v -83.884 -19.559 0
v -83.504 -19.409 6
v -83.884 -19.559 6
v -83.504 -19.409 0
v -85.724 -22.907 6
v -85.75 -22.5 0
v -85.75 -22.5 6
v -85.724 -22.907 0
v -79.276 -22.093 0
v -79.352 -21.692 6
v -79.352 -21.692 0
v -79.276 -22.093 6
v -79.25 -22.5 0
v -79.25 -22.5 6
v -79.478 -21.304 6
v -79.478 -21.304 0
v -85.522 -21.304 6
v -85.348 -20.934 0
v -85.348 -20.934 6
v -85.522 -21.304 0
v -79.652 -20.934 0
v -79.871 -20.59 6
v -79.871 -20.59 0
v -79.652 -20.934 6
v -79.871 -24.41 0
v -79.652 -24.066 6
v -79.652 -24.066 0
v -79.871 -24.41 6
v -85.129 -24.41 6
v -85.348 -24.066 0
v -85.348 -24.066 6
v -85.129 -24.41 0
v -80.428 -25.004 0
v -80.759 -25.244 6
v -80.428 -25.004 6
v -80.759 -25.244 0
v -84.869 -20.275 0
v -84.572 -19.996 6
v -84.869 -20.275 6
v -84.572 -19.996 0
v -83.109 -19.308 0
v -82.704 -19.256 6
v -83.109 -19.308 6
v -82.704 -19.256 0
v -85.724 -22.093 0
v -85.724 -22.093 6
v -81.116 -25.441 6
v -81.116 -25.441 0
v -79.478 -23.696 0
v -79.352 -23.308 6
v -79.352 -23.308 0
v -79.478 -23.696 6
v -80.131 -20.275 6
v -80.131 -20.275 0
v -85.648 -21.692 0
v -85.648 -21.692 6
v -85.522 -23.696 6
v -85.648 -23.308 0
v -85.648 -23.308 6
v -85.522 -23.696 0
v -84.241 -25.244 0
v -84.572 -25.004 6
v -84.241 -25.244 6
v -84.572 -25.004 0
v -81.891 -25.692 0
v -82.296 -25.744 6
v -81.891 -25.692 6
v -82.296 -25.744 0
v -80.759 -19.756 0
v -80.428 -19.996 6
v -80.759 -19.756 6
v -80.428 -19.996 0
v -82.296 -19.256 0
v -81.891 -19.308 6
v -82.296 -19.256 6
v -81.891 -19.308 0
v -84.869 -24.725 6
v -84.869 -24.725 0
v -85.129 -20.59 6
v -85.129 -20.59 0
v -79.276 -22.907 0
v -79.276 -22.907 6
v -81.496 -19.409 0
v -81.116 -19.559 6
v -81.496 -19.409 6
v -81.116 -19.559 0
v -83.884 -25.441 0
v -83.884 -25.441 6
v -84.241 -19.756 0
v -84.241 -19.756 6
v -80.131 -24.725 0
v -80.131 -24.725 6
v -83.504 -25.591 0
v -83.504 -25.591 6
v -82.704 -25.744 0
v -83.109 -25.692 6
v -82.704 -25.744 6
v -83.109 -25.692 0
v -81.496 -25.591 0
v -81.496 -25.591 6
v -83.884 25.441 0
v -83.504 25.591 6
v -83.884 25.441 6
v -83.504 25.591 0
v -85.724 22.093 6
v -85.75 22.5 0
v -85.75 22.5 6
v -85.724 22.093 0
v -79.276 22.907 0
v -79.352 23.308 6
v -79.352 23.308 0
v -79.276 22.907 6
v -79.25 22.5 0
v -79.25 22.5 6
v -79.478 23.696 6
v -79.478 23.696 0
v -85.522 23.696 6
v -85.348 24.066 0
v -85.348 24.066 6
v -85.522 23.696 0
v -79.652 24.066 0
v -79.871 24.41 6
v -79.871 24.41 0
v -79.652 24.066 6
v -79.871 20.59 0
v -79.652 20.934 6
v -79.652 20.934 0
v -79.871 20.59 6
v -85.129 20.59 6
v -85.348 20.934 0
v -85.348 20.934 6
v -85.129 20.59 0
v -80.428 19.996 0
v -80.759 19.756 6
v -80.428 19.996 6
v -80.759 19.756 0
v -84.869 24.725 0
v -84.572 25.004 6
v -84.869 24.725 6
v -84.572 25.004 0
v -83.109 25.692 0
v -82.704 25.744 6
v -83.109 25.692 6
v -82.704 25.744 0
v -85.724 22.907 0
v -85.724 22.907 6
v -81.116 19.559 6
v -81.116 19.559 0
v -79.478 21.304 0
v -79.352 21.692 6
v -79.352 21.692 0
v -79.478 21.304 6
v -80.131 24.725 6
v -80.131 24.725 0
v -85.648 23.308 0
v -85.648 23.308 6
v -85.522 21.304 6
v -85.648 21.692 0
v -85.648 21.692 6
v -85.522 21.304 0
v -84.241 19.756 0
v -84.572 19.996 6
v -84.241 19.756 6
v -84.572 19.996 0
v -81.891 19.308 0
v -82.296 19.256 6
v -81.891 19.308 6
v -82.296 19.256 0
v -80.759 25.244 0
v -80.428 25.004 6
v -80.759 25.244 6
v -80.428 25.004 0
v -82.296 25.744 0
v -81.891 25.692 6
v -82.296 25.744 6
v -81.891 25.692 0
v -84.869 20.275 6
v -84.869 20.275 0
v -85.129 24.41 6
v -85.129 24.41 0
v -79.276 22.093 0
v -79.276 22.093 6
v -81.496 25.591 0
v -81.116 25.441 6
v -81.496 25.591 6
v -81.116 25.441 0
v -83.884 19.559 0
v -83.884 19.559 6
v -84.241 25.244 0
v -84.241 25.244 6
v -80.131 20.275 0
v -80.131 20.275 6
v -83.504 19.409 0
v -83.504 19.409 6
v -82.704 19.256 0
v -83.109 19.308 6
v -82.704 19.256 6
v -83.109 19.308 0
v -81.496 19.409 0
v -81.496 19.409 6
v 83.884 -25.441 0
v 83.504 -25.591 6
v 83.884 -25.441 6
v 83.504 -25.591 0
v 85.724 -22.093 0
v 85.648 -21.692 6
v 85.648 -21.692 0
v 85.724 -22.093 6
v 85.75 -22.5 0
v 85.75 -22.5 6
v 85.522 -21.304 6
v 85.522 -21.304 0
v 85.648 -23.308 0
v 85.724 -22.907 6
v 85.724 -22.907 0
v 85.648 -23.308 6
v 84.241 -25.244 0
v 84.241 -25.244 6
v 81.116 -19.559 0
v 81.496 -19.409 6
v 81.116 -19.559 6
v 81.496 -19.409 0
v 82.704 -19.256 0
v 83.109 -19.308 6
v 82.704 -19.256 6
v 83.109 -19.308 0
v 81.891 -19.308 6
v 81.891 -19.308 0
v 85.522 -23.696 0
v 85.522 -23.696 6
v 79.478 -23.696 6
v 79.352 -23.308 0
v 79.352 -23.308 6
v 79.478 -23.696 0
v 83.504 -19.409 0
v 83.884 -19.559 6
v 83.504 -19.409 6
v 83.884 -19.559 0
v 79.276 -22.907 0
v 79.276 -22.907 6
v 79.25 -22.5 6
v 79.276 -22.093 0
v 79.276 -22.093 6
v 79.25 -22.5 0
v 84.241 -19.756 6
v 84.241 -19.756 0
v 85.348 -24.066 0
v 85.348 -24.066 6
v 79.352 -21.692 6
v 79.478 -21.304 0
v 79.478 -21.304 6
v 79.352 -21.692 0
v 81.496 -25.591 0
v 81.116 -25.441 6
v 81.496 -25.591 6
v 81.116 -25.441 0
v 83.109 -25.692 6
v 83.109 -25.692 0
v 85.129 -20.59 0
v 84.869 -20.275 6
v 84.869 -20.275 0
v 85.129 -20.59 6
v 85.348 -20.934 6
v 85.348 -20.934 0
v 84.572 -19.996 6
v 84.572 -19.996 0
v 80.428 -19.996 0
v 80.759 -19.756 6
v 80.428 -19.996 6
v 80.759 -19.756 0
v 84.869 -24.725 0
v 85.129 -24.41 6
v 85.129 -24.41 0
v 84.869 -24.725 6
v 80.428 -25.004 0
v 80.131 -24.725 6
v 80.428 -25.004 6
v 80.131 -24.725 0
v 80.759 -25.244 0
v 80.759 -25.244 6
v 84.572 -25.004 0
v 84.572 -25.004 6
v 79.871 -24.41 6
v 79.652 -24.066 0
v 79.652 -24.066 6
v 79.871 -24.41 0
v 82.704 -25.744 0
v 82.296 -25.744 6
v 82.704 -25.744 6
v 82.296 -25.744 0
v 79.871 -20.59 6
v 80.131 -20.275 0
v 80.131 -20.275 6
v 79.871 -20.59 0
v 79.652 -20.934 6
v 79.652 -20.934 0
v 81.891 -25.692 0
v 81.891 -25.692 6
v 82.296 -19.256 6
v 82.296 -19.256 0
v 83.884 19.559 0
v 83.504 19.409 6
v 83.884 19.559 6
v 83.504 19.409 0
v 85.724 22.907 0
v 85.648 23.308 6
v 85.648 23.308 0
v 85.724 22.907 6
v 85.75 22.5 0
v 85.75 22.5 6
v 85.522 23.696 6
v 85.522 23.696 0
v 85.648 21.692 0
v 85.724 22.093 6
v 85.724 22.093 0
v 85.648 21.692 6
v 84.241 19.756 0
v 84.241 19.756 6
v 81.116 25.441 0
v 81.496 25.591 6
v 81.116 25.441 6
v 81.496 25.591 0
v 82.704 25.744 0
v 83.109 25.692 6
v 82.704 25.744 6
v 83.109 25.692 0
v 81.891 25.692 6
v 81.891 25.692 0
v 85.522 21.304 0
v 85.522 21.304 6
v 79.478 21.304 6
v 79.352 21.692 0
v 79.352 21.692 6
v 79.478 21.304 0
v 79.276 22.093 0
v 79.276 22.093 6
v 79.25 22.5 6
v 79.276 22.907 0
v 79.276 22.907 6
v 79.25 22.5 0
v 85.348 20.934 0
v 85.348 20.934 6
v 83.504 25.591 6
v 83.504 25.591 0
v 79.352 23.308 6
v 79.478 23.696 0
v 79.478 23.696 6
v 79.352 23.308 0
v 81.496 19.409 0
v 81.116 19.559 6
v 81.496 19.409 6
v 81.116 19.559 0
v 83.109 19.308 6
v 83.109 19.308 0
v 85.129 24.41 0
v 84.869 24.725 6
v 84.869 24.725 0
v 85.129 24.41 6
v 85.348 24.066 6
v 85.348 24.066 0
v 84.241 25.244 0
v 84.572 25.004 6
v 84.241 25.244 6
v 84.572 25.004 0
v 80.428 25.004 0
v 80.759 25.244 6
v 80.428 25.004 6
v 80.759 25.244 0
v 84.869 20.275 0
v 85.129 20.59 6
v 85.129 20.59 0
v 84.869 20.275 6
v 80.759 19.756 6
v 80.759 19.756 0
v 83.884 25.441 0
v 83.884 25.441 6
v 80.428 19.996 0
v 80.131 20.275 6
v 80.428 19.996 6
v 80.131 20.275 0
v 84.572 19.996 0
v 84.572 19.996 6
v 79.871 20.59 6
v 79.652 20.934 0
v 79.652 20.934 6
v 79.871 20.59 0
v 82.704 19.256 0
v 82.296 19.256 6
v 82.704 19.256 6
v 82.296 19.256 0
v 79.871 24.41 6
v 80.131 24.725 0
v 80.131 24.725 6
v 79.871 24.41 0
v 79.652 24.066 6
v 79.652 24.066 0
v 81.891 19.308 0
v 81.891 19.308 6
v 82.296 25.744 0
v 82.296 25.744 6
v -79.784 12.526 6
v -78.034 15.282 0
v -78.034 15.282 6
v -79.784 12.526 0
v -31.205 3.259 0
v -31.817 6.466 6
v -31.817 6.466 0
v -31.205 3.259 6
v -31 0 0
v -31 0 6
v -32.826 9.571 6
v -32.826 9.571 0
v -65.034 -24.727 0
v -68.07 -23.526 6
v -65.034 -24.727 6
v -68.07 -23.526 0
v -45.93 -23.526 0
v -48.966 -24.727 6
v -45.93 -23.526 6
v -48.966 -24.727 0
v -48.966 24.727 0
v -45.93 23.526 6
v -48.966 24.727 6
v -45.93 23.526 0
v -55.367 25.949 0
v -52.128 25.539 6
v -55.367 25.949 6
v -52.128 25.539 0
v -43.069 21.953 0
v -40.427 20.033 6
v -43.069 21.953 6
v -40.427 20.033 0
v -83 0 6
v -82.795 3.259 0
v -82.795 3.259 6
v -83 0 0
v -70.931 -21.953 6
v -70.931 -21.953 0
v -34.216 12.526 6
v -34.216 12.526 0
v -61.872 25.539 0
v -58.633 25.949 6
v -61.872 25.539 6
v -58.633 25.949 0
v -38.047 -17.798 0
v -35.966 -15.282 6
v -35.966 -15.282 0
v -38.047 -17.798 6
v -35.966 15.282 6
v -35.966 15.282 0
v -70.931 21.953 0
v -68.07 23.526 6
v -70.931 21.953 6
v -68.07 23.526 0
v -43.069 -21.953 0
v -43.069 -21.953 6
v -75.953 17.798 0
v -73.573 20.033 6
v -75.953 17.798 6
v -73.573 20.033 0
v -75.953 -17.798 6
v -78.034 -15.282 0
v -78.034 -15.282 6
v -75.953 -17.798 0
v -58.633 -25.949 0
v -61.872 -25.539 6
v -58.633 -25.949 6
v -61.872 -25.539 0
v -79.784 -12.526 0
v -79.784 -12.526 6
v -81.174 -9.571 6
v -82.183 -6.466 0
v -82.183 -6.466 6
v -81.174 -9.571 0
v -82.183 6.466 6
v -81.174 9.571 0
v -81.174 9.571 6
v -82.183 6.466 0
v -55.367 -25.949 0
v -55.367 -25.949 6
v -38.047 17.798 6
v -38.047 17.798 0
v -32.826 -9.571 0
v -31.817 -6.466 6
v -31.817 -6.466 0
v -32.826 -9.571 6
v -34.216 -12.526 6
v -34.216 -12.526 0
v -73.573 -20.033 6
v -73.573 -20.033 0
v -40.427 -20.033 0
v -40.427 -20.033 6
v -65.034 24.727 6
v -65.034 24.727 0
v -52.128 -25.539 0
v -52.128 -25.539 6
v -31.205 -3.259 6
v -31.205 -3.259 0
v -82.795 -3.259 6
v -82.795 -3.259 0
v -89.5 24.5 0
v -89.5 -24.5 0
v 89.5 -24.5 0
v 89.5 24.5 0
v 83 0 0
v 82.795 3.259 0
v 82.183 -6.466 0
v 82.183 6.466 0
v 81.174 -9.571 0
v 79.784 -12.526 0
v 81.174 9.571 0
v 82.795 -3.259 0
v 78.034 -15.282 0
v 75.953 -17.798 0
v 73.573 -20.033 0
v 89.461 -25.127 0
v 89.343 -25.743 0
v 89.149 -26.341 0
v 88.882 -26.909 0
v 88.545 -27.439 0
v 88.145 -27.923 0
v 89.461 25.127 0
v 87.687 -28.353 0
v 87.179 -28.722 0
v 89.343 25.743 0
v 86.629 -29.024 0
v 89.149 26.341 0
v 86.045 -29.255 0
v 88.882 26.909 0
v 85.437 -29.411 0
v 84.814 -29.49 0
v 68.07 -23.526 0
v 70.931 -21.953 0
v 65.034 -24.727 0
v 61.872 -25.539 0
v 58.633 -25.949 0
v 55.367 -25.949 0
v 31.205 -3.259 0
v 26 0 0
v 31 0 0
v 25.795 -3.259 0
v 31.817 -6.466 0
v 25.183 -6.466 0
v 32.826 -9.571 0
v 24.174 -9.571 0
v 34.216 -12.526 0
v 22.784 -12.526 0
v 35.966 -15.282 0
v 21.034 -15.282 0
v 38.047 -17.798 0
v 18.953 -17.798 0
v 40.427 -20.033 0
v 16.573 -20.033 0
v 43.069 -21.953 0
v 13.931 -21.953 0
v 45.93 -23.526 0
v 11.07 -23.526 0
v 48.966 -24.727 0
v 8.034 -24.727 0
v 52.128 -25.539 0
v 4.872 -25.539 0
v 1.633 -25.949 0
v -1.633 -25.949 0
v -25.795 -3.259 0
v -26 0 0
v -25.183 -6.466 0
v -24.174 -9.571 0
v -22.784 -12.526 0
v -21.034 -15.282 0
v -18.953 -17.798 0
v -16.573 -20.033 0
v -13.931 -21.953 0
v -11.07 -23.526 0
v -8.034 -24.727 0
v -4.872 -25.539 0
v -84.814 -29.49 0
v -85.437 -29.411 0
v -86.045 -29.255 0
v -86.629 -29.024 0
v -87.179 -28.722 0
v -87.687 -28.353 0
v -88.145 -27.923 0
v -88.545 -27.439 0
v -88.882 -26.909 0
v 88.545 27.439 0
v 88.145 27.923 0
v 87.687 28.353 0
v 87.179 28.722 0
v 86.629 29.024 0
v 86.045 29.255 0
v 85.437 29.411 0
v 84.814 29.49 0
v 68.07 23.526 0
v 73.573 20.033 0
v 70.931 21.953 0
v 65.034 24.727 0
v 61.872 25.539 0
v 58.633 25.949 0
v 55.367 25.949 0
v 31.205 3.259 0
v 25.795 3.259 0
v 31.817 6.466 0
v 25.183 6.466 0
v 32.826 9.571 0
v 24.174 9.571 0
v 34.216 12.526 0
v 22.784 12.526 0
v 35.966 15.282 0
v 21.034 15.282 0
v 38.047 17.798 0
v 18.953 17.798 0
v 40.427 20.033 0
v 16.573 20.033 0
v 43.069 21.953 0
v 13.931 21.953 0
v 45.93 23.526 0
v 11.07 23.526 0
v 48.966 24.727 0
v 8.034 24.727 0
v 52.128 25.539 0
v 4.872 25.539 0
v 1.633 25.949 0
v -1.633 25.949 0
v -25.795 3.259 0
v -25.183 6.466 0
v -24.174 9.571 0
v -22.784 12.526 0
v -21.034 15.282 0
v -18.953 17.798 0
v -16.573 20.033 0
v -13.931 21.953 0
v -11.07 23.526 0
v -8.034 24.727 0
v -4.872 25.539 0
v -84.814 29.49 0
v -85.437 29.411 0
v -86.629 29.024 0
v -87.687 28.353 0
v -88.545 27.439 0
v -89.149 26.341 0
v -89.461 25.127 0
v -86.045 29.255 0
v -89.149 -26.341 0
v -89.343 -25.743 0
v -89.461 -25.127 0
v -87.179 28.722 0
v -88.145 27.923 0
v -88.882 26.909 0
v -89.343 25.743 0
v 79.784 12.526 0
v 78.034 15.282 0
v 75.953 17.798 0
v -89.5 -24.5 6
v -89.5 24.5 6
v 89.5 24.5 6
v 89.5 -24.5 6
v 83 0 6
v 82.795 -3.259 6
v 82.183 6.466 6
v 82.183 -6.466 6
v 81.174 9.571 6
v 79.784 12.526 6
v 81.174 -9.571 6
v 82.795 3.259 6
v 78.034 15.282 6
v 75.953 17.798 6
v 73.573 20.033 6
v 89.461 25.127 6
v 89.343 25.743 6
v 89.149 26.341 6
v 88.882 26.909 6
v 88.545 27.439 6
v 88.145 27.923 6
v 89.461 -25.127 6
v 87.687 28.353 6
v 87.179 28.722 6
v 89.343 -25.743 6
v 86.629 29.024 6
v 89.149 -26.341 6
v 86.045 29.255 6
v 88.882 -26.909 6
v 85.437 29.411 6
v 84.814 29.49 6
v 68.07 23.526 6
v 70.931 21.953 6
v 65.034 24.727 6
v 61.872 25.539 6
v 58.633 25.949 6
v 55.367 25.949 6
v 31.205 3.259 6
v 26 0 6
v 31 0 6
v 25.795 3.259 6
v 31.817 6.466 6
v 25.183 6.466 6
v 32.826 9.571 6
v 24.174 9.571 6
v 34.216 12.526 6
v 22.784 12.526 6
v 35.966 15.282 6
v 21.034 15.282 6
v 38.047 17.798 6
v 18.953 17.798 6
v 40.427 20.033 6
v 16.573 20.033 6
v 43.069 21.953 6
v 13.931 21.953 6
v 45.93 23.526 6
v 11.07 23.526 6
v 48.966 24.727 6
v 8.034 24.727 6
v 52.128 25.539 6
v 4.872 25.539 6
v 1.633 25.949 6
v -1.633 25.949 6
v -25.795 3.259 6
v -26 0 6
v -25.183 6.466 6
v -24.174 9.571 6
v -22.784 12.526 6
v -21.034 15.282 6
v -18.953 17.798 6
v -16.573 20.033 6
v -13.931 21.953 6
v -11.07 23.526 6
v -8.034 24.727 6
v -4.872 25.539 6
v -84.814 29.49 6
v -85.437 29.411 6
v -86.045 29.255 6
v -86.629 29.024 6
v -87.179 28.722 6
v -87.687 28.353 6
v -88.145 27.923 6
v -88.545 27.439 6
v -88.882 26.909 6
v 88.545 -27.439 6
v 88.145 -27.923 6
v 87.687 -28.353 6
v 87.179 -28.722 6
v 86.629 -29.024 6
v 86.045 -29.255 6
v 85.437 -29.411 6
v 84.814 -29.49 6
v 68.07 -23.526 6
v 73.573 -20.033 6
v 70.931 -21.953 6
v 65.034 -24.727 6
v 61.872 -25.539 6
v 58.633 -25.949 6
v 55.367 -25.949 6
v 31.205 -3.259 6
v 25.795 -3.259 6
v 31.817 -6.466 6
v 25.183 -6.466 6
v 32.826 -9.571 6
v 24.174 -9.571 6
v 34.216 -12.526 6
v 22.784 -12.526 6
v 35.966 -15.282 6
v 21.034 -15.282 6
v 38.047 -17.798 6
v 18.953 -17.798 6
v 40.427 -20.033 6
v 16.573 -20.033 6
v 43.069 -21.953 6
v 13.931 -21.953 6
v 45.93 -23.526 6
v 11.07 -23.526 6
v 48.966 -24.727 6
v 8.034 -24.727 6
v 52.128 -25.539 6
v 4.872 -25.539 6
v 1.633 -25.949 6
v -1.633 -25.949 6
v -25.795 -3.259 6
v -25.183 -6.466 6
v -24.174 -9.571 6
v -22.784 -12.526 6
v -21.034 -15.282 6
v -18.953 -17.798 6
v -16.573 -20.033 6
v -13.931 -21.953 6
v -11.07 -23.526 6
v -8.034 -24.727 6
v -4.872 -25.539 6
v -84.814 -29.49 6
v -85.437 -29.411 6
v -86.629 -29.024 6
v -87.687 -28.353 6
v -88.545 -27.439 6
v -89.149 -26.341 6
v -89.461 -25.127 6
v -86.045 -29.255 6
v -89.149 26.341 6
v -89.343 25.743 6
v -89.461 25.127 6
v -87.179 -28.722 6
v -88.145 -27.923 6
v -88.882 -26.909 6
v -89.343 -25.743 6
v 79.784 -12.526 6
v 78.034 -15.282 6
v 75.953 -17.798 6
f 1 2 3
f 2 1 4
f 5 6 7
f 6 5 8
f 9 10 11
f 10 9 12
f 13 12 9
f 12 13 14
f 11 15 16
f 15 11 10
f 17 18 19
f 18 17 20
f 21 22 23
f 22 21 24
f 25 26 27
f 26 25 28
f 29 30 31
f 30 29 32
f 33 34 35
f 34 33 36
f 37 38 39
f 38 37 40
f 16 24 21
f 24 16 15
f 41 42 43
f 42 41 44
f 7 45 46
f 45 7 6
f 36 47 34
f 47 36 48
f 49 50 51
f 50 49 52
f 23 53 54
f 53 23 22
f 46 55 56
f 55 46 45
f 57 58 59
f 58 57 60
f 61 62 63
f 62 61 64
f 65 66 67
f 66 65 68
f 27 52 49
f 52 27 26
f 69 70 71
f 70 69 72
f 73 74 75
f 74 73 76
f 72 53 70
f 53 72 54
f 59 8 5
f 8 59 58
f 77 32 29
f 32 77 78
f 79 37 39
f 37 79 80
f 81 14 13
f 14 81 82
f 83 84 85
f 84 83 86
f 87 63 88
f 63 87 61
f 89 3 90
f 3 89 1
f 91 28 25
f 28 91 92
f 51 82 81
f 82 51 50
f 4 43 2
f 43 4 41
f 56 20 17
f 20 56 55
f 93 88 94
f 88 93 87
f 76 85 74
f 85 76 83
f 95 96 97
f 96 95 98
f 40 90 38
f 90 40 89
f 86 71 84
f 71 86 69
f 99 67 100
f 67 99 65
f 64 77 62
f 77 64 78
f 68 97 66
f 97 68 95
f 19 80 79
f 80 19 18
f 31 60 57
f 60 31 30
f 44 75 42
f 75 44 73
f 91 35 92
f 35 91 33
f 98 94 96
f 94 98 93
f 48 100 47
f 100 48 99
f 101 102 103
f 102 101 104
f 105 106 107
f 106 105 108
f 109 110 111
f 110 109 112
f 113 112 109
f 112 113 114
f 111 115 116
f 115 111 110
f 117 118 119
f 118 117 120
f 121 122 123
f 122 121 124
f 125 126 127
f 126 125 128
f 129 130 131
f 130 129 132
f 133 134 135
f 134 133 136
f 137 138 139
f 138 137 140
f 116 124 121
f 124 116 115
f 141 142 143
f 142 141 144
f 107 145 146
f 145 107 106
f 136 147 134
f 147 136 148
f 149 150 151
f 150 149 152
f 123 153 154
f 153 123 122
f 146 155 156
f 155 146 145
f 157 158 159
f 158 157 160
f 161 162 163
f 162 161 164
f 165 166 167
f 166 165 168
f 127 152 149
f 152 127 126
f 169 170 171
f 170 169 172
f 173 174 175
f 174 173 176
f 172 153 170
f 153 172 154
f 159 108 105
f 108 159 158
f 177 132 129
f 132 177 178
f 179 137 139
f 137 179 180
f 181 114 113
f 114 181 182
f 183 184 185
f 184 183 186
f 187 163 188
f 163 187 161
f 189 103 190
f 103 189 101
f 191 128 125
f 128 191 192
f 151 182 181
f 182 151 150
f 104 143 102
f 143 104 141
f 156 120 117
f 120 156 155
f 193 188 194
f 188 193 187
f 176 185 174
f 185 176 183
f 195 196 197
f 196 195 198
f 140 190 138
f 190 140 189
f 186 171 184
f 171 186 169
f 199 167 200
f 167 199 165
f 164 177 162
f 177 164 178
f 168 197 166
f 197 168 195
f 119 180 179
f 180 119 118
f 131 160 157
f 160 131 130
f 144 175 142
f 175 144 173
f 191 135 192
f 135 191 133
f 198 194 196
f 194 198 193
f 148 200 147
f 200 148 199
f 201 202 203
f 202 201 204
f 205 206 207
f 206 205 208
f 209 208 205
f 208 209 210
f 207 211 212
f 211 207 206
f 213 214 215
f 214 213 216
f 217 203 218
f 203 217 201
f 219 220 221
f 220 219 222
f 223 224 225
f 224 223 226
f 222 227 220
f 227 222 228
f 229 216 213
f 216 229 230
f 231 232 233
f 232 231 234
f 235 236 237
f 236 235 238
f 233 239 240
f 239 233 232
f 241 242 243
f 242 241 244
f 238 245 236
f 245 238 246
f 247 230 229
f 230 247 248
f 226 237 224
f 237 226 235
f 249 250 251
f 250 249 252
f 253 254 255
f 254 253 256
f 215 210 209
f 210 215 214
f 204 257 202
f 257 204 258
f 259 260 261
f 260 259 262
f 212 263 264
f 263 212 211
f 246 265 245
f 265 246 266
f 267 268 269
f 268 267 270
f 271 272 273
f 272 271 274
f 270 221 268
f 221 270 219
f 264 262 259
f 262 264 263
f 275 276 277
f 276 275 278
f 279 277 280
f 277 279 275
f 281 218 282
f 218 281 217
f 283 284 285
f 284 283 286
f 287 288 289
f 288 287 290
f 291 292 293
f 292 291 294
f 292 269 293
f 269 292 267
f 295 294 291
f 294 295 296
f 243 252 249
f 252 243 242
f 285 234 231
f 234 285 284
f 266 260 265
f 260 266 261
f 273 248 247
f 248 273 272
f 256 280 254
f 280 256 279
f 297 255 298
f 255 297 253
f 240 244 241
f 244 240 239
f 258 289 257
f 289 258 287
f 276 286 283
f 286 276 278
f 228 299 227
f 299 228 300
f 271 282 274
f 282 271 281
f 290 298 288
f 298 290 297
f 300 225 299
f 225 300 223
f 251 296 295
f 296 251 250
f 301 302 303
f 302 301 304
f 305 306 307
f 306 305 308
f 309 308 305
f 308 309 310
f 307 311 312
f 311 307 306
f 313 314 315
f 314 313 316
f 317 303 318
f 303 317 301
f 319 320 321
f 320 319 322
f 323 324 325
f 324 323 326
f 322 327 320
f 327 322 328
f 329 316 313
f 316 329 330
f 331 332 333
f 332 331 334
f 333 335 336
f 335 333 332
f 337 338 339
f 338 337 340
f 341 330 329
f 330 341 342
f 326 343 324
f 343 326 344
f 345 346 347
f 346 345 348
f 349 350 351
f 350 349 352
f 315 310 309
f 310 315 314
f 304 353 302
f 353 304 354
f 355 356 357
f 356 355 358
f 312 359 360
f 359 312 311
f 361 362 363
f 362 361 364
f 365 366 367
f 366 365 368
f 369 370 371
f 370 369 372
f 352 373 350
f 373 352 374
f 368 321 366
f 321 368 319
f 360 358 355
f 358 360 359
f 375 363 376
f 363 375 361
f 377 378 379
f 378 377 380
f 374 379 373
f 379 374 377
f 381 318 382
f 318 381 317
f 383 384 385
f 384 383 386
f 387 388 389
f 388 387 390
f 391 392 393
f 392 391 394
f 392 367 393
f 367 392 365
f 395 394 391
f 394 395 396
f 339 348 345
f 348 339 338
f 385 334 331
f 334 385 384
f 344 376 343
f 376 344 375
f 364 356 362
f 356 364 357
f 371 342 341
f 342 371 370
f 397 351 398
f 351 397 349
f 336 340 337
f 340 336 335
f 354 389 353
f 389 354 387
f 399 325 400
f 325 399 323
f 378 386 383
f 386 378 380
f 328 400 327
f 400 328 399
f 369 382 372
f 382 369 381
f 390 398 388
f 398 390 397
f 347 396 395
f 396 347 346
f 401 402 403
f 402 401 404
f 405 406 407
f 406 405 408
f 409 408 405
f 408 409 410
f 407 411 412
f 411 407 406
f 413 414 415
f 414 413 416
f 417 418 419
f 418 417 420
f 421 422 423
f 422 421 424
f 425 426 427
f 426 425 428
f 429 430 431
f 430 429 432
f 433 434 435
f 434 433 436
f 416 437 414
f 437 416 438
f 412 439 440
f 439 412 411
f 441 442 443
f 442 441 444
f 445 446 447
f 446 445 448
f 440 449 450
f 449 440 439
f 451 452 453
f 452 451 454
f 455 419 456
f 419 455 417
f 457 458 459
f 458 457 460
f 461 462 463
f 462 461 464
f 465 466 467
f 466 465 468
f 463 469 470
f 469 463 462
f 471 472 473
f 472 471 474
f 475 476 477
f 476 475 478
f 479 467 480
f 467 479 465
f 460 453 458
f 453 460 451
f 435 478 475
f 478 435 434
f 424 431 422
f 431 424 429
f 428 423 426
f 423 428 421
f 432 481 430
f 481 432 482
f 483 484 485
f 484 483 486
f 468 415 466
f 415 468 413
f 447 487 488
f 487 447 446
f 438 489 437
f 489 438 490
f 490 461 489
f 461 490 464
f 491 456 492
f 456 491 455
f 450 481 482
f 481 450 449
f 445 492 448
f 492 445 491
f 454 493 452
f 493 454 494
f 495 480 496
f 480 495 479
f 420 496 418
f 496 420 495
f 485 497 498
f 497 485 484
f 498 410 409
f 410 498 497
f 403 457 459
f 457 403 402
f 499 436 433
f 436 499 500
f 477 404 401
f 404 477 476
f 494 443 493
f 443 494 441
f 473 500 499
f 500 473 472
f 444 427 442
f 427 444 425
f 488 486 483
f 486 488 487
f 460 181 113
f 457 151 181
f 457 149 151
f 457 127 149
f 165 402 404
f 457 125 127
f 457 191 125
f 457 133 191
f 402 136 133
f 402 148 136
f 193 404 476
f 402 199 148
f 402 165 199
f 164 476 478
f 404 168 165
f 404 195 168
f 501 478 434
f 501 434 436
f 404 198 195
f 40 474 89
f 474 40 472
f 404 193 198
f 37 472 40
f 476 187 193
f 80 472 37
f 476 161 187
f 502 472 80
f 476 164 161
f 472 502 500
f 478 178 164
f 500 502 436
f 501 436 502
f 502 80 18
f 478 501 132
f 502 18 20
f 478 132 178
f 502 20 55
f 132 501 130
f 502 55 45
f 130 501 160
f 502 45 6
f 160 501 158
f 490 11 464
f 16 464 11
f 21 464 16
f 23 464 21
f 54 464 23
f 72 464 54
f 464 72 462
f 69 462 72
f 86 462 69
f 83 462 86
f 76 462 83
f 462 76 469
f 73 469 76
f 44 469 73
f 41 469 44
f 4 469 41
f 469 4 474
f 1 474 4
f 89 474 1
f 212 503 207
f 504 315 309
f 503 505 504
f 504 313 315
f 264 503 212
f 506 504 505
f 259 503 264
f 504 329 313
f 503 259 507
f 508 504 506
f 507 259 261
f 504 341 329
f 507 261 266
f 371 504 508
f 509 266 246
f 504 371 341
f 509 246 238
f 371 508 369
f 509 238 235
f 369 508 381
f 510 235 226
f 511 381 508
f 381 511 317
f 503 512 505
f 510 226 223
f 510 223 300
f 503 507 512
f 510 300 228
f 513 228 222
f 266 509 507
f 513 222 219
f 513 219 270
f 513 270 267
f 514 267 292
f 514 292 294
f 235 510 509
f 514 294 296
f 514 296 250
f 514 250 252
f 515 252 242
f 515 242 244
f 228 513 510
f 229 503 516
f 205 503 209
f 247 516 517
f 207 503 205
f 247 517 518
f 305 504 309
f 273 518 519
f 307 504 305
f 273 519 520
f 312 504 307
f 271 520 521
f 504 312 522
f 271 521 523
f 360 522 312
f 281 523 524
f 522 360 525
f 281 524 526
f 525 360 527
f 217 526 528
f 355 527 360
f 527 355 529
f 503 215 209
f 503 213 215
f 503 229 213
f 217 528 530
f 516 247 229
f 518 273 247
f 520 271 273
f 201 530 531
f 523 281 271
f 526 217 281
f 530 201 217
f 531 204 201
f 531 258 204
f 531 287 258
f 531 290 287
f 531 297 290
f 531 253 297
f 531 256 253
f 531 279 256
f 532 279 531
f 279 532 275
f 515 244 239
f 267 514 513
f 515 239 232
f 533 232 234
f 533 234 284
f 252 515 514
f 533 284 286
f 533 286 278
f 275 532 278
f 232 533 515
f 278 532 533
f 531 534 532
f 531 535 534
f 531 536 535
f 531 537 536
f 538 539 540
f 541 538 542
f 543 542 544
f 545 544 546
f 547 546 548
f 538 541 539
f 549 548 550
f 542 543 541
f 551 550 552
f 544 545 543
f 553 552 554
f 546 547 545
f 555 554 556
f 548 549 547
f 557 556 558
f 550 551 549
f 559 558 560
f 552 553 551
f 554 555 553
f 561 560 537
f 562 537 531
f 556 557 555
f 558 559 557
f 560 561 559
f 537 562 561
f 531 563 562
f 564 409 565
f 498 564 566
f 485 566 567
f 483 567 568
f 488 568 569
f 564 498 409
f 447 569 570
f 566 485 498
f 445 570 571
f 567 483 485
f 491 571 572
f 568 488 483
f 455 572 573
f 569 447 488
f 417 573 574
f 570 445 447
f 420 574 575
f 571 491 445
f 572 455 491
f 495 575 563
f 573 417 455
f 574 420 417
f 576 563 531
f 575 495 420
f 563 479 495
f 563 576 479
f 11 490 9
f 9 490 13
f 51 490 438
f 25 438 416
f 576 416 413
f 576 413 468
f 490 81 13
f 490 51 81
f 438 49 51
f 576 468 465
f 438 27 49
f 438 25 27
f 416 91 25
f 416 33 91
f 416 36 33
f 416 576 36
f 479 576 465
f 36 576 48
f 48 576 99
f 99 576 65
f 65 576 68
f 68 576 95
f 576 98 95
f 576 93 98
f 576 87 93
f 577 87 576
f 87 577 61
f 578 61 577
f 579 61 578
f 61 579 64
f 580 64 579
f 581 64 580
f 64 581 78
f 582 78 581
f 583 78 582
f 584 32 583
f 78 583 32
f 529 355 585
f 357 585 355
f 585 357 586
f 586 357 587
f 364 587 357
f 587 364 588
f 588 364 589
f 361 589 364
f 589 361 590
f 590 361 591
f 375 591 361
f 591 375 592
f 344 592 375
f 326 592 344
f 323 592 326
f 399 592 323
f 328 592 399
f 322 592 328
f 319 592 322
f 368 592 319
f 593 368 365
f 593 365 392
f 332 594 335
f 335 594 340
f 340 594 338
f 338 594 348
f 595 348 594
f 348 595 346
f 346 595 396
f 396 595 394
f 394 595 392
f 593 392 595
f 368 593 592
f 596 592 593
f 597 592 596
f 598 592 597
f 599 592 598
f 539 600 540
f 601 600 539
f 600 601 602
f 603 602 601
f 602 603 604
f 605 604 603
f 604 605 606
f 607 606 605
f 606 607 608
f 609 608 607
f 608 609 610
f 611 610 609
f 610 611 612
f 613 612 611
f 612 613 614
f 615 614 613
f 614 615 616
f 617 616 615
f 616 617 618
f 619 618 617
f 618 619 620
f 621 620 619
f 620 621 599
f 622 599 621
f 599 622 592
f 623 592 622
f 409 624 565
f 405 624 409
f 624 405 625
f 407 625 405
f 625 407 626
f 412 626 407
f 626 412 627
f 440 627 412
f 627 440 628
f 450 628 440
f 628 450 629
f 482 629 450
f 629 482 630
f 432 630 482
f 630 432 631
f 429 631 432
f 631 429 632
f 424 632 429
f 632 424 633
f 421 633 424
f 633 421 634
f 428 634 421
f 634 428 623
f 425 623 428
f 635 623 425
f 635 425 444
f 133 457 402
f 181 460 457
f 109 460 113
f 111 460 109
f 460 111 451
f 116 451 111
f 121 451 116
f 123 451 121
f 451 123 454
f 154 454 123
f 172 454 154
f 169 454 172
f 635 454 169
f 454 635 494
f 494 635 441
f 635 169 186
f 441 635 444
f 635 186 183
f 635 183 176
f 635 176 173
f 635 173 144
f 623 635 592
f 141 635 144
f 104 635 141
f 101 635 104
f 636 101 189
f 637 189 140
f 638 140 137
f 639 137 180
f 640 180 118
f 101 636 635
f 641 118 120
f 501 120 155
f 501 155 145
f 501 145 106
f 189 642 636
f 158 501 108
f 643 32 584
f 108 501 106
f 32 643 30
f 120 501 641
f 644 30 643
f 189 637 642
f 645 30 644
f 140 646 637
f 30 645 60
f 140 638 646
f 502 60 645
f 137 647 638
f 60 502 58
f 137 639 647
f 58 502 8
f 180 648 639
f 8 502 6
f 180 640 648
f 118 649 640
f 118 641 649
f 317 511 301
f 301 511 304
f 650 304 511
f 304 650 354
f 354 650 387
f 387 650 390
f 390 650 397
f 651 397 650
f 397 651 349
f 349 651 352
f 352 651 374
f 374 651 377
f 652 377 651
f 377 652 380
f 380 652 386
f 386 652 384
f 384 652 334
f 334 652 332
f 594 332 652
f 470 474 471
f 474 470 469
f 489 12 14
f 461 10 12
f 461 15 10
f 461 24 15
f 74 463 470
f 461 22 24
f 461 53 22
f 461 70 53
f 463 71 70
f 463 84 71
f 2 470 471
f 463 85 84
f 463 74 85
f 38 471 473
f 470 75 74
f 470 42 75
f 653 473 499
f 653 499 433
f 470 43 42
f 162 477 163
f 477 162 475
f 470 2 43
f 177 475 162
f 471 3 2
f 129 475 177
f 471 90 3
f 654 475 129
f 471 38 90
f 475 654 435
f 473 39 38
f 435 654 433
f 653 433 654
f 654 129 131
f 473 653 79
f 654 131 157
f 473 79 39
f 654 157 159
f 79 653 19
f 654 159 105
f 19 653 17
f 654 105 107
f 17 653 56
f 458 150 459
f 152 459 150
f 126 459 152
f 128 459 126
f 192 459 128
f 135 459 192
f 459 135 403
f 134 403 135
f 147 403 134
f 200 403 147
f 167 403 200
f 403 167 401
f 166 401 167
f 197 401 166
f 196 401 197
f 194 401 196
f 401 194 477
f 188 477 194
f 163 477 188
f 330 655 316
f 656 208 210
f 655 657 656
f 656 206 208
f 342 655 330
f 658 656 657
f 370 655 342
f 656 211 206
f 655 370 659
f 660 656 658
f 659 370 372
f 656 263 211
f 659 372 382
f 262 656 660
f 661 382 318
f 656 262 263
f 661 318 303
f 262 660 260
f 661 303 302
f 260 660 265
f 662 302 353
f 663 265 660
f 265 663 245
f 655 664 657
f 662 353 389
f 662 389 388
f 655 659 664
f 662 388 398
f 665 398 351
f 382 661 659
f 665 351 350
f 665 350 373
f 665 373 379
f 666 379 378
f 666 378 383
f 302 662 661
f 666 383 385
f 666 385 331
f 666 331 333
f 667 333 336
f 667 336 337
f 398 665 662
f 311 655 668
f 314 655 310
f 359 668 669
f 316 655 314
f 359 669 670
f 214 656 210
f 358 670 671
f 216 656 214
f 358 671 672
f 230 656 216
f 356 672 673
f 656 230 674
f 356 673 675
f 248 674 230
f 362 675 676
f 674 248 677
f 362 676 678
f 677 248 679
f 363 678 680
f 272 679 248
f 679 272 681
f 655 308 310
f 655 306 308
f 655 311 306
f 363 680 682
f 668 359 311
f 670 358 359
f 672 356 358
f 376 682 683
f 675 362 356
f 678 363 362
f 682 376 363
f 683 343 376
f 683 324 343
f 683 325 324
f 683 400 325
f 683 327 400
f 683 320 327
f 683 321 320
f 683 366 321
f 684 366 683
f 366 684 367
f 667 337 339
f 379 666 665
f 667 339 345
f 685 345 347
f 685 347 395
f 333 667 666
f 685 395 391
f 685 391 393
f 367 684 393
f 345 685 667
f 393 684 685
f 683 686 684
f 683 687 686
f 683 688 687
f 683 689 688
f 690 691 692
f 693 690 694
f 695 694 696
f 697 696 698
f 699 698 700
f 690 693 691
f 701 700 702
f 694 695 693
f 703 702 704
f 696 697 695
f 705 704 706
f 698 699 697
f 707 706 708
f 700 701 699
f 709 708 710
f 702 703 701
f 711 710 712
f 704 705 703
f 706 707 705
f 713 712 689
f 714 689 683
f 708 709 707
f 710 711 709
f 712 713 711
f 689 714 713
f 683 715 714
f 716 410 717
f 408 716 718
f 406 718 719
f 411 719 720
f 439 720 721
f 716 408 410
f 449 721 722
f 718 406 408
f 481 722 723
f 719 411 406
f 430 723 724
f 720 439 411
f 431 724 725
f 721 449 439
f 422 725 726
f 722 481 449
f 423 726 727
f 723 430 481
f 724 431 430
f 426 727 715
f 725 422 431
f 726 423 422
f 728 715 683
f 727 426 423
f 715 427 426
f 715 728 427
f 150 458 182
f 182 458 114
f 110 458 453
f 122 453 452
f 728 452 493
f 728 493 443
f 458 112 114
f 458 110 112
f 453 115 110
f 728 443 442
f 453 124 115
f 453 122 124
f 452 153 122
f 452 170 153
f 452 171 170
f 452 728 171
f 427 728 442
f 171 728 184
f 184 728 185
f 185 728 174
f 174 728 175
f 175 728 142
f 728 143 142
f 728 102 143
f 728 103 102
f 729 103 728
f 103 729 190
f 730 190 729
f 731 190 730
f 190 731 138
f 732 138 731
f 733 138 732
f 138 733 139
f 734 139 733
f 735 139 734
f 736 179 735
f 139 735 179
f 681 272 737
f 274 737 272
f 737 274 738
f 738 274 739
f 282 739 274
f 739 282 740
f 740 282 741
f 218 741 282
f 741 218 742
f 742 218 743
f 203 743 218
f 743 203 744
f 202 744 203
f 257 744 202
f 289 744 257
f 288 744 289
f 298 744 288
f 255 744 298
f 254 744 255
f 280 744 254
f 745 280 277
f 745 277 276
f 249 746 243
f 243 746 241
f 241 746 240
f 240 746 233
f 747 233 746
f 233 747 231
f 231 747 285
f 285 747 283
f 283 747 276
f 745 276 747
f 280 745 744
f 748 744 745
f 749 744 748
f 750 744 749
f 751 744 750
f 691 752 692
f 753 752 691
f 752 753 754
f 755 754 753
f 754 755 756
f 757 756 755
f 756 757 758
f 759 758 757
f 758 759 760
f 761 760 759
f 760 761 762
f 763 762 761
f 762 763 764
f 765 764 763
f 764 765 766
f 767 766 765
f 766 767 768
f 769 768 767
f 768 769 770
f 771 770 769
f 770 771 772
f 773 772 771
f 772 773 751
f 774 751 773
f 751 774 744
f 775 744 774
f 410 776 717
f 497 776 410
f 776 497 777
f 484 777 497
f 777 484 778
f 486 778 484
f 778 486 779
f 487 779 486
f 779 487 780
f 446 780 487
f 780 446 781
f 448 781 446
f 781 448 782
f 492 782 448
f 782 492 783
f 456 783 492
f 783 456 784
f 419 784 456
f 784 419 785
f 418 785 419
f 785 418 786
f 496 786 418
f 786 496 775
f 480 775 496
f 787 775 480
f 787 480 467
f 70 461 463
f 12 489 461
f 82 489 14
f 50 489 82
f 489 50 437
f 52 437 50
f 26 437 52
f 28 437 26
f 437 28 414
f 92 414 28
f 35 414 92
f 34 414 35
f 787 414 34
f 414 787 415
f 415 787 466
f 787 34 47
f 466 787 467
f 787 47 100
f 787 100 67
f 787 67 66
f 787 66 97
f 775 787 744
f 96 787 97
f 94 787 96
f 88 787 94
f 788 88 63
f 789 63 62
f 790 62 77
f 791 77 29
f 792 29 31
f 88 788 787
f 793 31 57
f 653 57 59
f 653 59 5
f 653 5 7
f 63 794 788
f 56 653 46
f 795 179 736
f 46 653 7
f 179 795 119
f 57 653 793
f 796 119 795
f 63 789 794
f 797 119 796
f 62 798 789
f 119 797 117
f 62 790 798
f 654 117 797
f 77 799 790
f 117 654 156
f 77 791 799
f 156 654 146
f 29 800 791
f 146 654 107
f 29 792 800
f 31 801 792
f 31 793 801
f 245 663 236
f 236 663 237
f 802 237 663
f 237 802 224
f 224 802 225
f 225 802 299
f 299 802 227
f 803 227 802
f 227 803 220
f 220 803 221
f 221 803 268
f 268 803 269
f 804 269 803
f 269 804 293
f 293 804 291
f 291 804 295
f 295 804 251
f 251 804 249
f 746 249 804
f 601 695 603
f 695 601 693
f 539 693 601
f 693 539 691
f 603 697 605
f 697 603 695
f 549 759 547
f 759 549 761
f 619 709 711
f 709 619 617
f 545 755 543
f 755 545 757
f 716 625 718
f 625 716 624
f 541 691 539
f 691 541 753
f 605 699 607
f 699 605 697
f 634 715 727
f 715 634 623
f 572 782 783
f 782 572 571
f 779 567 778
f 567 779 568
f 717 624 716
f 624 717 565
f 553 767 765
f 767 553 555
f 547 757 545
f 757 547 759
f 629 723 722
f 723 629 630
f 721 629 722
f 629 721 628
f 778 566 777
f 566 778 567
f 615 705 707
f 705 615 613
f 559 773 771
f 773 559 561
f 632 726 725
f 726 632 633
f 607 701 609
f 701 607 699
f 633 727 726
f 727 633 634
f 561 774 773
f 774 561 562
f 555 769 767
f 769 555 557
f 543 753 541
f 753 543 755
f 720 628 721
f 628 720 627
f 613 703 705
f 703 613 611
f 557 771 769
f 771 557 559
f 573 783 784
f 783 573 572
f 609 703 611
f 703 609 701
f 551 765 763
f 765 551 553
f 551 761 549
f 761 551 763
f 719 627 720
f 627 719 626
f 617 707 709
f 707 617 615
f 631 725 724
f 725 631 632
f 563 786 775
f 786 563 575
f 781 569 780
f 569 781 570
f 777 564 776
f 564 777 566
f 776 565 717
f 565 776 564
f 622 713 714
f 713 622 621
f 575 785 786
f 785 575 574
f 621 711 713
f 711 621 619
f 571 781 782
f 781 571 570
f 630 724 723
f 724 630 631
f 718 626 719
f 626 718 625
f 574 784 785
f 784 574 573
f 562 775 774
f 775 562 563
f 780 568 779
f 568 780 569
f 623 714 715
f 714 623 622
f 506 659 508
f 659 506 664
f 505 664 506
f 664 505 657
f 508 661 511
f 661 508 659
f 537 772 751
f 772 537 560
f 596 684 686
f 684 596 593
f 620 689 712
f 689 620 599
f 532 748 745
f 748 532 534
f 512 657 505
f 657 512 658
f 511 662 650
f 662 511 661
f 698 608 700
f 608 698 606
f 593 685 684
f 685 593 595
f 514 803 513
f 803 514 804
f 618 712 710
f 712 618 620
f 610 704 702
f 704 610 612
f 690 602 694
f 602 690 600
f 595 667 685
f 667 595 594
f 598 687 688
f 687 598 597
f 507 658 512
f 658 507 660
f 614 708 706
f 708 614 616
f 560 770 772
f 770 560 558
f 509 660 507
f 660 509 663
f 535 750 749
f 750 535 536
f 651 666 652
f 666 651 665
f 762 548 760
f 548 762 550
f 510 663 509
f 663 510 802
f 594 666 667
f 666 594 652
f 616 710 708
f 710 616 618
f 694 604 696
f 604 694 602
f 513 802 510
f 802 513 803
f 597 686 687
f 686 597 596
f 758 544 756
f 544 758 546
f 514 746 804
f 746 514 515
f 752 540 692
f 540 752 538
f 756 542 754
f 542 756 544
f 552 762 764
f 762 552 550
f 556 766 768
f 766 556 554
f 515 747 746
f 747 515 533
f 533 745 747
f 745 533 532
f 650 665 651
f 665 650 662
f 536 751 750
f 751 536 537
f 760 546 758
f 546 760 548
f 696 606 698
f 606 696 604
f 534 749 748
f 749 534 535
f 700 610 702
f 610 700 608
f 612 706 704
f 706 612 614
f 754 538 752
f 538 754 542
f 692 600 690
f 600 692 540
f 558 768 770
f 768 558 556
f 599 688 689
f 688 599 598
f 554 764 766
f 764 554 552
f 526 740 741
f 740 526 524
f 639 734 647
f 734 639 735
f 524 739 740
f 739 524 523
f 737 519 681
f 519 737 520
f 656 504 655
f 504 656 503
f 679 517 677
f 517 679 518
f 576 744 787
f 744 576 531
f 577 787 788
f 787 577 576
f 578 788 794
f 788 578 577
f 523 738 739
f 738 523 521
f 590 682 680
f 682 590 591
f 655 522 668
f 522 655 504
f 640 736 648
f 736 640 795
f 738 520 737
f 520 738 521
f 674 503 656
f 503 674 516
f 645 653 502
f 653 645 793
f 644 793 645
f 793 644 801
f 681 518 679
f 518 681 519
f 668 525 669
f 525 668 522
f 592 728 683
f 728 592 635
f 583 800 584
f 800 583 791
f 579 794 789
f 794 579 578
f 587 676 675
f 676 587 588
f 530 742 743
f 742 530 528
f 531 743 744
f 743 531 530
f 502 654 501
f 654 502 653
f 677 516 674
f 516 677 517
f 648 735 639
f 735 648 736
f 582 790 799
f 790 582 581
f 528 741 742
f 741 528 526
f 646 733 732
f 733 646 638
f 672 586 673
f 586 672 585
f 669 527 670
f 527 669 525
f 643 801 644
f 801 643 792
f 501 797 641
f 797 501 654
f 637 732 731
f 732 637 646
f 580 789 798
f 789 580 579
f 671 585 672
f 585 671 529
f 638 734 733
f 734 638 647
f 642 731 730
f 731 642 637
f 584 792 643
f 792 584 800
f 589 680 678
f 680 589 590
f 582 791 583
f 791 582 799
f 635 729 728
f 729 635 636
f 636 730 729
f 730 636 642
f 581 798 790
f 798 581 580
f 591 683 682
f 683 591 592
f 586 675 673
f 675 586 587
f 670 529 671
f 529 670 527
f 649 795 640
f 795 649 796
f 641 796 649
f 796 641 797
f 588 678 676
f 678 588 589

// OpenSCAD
$fn = 50;


difference() {
	union() {
		hull() {
			translate(v = [-84.5000000000, 24.5000000000, 0]) {
				cylinder(h = 6, r = 5);
			}
			translate(v = [84.5000000000, 24.5000000000, 0]) {
				cylinder(h = 6, r = 5);
			}
			translate(v = [-84.5000000000, -24.5000000000, 0]) {
				cylinder(h = 6, r = 5);
			}
			translate(v = [84.5000000000, -24.5000000000, 0]) {
				cylinder(h = 6, r = 5);
			}
		}
	}
	union() {
		#translate(v = [-82.5000000000, -22.5000000000, -100.0000000000]) {
			cylinder(h = 200, r = 3.2500000000);
		}
		#translate(v = [-82.5000000000, 22.5000000000, -100.0000000000]) {
			cylinder(h = 200, r = 3.2500000000);
		}
		#translate(v = [82.5000000000, -22.5000000000, -100.0000000000]) {
			cylinder(h = 200, r = 3.2500000000);
		}
		#translate(v = [82.5000000000, 22.5000000000, -100.0000000000]) {
			cylinder(h = 200, r = 3.2500000000);
		}
		#translate(v = [-57.0000000000, 0, 0]) {
			cylinder(h = 6, r = 26.0000000000);
		}
		#cylinder(h = 6, r = 26.0000000000);
		#translate(v = [57.0000000000, 0, 0]) {
			cylinder(h = 6, r = 26.0000000000);
		}
	}
}
